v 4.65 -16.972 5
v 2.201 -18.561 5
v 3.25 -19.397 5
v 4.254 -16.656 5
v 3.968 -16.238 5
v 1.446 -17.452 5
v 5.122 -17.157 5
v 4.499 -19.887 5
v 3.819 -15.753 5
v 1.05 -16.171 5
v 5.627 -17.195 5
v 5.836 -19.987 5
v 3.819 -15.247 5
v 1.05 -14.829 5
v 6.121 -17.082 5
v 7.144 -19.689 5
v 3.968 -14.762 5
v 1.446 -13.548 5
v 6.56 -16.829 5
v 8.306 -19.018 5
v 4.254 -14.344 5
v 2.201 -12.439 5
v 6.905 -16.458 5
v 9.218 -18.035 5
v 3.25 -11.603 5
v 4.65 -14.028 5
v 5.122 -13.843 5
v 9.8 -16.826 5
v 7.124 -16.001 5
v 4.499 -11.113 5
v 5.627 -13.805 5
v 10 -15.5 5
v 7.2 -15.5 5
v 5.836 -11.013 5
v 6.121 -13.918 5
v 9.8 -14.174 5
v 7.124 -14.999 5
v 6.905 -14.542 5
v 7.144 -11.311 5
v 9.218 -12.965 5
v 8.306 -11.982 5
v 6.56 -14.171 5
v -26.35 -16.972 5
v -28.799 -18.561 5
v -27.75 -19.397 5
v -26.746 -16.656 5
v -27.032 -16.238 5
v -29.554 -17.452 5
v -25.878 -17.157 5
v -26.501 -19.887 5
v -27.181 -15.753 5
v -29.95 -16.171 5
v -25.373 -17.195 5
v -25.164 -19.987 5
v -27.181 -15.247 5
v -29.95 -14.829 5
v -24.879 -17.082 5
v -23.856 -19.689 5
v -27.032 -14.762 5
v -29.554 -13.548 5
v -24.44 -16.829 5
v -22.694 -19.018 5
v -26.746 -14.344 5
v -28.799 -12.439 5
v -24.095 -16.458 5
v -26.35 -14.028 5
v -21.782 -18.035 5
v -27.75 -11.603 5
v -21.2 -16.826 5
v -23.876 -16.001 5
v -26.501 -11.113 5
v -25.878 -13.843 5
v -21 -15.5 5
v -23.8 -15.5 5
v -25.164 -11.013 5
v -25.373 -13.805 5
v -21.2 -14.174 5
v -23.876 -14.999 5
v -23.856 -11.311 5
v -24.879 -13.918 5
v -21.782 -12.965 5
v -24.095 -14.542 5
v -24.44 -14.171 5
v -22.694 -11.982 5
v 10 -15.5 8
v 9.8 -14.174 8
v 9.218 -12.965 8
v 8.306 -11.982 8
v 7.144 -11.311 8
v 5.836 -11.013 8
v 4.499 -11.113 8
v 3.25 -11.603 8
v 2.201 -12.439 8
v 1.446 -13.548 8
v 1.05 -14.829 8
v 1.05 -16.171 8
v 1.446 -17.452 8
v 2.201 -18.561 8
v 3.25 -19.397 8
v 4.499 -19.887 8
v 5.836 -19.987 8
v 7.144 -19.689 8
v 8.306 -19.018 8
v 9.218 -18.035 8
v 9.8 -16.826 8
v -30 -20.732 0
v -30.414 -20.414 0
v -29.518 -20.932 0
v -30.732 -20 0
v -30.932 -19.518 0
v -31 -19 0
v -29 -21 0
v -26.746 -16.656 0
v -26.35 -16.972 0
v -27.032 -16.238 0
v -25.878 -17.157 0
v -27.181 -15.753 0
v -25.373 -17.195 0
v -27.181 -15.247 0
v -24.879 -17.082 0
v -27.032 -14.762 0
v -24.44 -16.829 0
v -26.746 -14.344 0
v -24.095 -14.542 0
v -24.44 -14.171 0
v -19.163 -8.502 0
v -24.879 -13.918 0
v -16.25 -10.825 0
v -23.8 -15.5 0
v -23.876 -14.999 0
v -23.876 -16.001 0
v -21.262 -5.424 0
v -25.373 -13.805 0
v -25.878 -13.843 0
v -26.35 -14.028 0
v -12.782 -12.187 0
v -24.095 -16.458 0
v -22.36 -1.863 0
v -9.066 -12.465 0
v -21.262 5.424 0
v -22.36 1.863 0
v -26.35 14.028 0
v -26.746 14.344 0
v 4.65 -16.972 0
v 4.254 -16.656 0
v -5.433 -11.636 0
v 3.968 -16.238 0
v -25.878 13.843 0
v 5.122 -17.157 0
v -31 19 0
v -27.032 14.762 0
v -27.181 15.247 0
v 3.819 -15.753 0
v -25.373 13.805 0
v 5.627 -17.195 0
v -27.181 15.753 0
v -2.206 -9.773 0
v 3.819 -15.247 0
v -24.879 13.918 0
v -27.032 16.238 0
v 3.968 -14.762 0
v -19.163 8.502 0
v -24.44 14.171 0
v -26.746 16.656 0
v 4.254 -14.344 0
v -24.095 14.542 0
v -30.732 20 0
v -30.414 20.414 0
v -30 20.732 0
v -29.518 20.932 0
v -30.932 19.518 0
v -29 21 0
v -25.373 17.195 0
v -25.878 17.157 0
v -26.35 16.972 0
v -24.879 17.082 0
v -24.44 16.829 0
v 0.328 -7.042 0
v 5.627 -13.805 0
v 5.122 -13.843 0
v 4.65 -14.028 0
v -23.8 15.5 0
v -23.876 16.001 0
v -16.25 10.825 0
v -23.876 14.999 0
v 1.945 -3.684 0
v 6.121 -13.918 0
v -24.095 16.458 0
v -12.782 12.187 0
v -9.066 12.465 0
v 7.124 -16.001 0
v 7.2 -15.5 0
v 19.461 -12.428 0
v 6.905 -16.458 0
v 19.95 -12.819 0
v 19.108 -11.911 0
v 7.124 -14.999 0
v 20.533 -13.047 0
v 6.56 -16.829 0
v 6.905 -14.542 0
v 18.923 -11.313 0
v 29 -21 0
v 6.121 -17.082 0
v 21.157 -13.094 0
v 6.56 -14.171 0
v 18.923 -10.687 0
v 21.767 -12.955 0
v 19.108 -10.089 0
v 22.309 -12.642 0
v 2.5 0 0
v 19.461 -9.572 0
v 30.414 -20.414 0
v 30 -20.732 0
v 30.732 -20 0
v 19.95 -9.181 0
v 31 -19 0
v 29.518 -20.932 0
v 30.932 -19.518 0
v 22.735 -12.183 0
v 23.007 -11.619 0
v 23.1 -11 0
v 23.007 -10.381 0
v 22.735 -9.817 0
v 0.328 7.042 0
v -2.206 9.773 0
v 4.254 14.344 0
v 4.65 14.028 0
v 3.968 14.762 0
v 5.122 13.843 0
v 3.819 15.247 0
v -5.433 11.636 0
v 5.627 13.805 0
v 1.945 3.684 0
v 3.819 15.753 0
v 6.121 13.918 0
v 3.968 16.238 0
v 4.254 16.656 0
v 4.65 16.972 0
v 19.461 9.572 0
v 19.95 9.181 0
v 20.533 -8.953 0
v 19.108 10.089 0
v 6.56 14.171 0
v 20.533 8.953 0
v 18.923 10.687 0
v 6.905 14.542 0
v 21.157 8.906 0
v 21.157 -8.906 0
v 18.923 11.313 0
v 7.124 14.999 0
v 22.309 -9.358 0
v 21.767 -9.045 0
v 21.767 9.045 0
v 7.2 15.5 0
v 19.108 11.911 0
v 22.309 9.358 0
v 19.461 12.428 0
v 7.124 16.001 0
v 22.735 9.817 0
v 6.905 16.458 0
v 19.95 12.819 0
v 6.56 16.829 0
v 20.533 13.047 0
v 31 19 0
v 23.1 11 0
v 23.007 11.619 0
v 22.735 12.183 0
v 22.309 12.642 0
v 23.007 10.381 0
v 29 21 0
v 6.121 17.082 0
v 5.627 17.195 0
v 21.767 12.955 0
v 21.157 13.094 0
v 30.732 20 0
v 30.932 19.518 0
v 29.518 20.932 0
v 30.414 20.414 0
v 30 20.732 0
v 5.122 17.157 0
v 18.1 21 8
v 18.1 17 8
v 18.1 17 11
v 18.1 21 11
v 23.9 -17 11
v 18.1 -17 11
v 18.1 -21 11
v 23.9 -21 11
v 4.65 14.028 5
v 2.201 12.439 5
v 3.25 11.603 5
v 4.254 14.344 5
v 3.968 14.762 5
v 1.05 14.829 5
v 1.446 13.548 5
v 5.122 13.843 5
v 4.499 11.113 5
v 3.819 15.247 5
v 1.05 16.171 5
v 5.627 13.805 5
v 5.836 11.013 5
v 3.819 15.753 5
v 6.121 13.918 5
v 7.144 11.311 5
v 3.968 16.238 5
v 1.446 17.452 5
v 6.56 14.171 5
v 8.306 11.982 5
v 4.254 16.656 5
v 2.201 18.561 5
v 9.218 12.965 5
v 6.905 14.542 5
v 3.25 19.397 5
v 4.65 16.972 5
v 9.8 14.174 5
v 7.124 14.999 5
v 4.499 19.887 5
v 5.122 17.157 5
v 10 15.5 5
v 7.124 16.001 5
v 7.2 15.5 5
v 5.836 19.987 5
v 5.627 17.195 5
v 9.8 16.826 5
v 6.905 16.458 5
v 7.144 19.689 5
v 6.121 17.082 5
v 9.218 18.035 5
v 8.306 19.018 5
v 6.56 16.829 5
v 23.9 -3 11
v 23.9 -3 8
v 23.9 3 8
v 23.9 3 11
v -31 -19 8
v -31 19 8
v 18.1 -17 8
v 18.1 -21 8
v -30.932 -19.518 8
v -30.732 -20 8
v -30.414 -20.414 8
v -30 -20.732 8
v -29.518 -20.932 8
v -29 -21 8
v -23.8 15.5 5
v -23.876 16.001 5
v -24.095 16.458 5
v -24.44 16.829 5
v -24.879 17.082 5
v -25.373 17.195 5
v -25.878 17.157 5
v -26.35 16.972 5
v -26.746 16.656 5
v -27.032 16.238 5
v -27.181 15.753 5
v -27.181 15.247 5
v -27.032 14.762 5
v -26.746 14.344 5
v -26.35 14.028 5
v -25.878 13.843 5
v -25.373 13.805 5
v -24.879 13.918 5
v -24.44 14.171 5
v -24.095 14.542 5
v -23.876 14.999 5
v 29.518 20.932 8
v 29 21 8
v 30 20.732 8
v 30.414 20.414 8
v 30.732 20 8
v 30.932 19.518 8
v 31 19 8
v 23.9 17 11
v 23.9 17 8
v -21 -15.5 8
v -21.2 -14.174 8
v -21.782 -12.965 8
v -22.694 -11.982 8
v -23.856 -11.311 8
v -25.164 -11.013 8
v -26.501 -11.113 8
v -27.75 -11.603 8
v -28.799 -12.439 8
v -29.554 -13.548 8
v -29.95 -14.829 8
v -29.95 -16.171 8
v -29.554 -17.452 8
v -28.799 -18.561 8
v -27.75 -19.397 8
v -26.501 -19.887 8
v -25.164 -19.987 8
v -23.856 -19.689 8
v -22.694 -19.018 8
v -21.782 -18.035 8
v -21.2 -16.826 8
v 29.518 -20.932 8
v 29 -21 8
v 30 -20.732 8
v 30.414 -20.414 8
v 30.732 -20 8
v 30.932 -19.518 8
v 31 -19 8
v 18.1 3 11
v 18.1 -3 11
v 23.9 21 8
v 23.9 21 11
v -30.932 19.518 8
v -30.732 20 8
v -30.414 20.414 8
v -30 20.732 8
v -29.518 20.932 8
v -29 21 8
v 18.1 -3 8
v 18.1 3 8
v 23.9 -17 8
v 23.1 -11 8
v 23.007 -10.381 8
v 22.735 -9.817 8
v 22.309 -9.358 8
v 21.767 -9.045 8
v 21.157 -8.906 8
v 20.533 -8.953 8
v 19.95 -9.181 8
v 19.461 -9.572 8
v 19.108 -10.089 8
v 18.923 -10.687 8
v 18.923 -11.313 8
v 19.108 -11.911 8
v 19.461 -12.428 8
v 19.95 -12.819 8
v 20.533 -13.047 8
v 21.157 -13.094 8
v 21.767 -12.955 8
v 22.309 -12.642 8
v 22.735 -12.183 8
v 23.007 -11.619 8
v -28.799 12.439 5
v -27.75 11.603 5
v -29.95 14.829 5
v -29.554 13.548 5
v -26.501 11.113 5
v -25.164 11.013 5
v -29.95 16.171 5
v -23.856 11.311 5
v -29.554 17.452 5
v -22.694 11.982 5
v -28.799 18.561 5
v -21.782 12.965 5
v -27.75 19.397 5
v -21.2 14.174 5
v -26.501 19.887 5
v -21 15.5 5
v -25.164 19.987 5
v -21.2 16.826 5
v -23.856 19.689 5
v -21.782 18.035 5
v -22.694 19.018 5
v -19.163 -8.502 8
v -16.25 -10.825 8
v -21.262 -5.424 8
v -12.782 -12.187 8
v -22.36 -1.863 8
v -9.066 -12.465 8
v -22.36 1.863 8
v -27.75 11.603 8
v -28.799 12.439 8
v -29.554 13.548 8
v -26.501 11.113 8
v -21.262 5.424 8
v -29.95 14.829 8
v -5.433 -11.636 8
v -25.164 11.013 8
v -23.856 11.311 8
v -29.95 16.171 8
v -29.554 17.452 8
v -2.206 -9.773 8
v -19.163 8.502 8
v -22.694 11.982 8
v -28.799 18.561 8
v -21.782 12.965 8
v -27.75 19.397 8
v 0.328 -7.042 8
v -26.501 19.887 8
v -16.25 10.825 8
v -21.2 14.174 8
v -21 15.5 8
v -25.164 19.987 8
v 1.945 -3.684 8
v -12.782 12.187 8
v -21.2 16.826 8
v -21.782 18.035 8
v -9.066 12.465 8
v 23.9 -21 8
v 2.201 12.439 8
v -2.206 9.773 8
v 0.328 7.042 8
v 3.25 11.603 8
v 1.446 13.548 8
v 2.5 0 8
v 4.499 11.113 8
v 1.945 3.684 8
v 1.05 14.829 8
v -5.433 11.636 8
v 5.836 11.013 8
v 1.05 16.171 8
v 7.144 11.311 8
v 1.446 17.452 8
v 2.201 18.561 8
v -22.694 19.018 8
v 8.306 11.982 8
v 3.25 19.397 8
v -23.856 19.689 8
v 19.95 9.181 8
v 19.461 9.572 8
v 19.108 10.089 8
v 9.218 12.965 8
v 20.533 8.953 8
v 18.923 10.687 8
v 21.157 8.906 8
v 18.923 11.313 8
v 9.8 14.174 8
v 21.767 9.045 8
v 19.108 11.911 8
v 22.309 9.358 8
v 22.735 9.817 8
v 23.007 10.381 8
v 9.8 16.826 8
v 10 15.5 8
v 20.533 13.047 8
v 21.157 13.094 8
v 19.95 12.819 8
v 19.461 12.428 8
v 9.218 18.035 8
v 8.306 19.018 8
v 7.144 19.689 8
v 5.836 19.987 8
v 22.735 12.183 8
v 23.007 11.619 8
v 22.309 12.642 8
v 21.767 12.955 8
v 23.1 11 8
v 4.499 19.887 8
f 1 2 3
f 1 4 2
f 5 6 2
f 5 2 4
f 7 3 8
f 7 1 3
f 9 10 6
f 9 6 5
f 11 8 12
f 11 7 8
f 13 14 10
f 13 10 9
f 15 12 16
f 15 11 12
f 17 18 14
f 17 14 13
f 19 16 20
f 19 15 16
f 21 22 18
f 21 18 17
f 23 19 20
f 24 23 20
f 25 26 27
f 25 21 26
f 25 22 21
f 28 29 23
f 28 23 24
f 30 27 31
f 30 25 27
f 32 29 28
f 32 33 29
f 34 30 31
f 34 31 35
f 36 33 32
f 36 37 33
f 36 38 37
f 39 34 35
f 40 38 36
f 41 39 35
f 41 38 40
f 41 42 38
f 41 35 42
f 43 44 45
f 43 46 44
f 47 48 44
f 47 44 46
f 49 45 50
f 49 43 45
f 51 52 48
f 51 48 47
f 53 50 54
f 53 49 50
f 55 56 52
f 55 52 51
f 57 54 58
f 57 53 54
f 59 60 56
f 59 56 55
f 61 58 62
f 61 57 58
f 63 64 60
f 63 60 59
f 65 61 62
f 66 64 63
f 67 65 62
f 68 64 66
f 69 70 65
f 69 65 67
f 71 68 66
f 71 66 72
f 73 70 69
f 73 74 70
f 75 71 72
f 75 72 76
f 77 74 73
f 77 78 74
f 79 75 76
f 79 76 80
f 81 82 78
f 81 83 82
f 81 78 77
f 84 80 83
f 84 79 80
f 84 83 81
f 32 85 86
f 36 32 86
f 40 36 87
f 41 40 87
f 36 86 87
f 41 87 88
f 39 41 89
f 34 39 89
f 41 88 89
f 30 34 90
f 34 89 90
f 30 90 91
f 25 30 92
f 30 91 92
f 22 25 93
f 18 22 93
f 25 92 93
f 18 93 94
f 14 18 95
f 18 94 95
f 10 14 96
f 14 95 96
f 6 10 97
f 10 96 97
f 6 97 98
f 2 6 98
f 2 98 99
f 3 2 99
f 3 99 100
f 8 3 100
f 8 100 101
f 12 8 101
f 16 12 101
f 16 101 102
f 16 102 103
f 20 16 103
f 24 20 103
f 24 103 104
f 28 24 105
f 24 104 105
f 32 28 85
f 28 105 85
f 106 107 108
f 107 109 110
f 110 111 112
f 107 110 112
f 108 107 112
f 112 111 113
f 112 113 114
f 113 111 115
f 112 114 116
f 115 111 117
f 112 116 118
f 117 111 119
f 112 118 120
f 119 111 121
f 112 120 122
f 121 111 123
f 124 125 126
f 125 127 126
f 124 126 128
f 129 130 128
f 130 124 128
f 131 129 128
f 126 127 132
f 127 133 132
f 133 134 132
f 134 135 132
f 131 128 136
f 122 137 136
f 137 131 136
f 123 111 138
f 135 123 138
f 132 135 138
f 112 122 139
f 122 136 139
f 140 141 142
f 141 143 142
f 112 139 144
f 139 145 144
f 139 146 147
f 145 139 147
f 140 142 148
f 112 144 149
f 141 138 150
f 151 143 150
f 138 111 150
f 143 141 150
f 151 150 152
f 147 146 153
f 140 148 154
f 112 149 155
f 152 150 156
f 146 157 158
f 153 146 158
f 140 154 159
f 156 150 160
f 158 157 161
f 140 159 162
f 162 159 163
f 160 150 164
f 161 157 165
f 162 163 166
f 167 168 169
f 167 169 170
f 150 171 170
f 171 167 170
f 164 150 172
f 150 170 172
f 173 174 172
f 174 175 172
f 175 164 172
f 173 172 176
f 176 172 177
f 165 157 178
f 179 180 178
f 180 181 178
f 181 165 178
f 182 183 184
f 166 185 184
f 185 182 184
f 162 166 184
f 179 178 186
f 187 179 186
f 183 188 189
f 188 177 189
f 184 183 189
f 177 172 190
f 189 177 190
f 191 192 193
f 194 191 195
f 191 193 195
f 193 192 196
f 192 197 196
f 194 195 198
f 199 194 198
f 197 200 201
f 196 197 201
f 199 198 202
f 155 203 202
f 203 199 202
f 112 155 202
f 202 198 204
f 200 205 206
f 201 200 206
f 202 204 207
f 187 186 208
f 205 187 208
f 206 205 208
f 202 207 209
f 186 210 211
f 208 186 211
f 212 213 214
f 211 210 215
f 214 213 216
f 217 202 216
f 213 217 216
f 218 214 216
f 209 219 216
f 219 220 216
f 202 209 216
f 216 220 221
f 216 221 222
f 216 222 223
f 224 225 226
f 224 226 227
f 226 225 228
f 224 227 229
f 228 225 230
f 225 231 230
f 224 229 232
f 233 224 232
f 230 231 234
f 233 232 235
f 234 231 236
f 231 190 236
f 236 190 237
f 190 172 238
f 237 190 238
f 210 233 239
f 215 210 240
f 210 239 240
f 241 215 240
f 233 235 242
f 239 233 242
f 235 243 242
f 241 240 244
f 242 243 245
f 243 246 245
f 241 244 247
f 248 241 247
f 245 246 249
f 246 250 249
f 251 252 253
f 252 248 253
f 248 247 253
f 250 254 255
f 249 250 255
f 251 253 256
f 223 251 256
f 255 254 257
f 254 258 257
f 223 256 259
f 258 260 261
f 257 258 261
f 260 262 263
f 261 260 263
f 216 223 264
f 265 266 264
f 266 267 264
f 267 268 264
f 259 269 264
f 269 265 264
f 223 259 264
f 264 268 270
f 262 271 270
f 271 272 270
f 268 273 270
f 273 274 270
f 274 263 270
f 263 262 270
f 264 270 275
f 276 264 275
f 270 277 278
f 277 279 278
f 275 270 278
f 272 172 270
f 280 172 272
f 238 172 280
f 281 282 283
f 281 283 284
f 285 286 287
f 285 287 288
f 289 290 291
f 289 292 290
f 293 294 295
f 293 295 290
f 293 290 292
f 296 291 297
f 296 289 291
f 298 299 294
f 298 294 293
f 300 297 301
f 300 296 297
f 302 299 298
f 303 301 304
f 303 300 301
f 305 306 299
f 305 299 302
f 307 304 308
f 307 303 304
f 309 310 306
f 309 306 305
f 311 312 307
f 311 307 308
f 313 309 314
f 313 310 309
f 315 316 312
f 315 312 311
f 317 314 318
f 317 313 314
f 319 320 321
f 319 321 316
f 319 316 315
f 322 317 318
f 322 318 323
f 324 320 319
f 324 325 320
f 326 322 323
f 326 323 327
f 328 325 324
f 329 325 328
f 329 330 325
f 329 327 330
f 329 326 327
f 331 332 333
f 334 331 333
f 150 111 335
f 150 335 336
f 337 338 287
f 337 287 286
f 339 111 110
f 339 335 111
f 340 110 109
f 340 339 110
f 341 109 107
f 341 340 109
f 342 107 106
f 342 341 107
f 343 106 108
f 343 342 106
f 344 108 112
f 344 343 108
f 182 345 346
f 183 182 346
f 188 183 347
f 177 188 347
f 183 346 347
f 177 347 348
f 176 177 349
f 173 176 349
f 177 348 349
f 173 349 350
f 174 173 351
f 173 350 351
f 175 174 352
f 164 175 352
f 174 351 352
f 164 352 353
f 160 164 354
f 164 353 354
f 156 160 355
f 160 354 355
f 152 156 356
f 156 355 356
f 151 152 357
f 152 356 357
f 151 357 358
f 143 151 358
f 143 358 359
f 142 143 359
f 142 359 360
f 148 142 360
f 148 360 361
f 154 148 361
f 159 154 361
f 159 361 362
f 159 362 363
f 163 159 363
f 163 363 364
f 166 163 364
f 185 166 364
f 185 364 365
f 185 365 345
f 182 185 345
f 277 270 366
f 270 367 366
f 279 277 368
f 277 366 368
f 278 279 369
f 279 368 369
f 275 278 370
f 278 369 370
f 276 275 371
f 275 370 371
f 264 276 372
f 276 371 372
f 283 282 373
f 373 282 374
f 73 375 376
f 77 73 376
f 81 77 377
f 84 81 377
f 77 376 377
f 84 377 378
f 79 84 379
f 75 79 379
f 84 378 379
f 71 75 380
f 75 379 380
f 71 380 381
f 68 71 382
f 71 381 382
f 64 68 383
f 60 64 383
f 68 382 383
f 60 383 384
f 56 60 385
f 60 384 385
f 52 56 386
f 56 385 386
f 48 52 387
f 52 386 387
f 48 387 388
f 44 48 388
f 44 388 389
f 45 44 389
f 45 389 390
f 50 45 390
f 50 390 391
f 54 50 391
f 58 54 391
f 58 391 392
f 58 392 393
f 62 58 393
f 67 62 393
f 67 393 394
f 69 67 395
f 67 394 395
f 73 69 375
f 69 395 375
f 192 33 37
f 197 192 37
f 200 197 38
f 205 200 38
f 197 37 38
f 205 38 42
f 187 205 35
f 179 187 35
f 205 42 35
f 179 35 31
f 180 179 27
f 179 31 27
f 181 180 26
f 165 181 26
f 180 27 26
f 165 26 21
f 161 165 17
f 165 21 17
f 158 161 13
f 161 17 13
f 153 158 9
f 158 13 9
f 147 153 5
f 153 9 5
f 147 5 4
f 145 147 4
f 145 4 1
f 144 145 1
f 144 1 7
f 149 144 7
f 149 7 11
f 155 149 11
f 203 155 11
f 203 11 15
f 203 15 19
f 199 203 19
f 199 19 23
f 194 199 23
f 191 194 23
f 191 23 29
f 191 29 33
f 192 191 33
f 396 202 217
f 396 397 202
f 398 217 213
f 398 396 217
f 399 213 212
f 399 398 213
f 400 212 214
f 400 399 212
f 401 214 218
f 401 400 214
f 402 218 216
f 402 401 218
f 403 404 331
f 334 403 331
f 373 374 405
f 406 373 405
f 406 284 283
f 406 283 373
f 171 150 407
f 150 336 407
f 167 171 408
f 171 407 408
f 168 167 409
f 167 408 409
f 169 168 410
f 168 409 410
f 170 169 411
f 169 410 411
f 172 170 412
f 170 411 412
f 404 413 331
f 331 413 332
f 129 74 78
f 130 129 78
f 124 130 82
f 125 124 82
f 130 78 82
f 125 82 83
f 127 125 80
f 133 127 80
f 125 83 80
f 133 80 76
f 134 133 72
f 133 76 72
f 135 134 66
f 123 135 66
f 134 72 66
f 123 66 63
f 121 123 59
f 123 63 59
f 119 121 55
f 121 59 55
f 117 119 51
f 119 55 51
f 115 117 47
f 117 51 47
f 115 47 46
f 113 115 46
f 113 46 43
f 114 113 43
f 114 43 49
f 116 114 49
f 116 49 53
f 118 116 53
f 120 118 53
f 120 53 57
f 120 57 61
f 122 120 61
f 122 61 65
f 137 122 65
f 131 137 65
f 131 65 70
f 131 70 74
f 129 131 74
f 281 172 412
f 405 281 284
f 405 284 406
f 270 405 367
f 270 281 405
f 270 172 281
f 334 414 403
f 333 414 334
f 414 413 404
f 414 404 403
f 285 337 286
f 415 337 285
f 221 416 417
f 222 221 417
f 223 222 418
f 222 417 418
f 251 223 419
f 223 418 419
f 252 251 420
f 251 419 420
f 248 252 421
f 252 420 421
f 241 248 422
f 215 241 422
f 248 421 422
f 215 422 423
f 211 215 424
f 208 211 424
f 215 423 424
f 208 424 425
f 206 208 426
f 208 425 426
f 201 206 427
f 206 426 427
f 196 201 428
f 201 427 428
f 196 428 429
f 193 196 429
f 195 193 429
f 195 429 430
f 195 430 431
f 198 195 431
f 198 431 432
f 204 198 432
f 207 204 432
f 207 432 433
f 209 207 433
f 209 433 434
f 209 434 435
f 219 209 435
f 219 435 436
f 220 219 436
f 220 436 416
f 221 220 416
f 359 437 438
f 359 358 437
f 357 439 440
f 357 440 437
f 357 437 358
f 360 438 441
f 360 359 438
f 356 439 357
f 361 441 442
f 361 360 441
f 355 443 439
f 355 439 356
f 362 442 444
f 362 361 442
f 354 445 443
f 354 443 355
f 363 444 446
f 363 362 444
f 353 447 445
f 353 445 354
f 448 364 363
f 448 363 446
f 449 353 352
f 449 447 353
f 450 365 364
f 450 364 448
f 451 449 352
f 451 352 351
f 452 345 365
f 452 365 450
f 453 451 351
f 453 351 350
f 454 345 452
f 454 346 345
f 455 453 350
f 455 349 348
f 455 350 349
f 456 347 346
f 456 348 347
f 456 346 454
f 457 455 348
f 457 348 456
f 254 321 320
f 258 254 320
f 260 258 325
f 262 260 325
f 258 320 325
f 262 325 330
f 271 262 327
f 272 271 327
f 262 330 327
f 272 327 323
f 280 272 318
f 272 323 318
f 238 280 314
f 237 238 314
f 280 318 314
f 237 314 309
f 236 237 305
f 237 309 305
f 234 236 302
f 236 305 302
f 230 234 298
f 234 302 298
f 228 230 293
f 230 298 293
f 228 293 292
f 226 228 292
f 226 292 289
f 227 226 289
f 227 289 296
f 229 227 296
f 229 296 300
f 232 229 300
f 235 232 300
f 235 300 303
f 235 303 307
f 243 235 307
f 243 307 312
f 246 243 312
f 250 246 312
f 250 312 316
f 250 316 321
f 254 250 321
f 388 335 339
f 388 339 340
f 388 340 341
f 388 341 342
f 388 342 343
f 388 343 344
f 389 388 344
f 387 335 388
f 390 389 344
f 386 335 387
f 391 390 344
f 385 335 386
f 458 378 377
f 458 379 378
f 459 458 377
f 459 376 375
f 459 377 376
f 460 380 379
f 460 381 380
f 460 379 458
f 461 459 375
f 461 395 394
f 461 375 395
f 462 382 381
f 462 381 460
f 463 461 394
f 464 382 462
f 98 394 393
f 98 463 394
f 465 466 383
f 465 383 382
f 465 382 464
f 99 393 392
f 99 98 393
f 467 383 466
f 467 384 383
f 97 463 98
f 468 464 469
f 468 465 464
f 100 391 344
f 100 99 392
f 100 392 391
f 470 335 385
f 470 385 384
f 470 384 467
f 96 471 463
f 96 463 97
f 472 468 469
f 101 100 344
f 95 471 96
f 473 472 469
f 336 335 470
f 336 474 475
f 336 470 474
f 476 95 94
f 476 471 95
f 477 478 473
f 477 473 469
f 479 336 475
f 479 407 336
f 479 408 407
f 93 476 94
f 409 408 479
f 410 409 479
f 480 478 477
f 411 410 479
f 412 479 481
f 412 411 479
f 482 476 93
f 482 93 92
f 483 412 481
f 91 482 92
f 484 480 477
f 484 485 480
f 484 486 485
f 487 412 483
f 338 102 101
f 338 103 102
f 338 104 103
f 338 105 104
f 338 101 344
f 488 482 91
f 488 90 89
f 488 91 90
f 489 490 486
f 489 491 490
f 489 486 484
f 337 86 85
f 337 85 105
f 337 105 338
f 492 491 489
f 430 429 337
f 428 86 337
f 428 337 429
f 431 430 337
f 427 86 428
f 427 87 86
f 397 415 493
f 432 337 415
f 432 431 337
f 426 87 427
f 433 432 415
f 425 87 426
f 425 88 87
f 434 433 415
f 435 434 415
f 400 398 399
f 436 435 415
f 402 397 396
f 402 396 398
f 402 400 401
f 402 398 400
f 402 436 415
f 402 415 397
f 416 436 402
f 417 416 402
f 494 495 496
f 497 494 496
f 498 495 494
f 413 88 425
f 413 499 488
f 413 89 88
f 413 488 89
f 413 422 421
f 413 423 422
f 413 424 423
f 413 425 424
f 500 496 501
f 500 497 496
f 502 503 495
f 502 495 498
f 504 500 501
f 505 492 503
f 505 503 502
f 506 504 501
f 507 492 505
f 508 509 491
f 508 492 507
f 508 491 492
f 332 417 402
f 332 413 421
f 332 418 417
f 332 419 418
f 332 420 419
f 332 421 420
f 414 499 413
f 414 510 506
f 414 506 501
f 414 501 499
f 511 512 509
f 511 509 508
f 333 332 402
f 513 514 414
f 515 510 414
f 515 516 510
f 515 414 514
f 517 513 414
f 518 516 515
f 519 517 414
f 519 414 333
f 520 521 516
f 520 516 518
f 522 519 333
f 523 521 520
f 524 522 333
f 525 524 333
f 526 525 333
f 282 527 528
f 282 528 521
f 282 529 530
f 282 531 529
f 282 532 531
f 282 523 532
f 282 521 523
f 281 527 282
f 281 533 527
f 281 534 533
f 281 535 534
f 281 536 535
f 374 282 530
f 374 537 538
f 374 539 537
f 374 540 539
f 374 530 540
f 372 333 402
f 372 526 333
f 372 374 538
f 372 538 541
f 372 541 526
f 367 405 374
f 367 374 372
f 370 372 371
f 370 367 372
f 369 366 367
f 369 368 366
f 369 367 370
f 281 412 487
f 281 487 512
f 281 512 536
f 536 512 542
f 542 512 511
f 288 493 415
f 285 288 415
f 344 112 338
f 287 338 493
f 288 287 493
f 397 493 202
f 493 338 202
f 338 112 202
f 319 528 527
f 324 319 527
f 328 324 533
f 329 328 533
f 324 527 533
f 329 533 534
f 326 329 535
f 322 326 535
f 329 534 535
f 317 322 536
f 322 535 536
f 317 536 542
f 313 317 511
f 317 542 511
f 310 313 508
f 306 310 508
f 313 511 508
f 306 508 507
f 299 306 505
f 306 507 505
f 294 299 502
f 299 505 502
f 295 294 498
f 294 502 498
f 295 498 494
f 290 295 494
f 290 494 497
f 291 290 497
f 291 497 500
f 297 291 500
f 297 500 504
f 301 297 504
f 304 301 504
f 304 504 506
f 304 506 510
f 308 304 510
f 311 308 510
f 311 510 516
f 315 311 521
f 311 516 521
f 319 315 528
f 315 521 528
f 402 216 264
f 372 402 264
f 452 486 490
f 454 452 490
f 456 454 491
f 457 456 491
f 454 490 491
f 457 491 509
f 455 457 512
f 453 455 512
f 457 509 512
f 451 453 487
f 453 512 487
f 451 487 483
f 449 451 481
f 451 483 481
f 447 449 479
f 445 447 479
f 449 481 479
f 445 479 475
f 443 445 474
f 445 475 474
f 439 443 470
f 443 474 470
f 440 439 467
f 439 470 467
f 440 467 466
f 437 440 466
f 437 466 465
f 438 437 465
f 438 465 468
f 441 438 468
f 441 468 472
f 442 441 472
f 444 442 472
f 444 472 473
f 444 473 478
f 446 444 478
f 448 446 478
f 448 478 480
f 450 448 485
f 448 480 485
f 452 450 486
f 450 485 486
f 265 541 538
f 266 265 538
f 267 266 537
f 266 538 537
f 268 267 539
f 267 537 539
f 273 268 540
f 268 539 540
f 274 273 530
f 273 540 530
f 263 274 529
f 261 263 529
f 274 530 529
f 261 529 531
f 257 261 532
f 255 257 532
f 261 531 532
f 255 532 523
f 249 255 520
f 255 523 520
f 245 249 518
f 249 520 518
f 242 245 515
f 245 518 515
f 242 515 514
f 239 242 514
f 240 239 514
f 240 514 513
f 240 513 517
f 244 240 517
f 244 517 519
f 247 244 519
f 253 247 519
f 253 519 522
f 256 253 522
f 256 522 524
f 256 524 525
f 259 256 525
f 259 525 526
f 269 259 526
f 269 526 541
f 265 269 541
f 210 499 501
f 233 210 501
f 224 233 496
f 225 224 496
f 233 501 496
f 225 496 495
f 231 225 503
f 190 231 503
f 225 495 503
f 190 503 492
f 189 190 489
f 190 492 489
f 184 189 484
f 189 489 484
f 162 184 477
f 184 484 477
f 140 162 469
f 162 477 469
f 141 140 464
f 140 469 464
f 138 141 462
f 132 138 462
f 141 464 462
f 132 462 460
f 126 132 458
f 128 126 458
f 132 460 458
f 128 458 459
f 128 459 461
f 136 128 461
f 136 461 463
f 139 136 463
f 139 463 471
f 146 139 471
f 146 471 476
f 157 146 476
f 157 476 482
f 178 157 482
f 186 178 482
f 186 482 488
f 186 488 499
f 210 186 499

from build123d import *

# Parameters (mm, degrees)
ESQUISSE1_W             = 62
ESQUISSE1_H             = 42
BOSS_EXTRU_1_DEPTH      = 8
ESQUISSE2_R             = 2.1
ESQUISSE2_R_2           = 12.5
ESQUISSE2_R_3           = 1.7
ENL_V_MAT_EXTRU_1_DEPTH = 9
ESQUISSE3_W             = 5.8
ESQUISSE3_H             = 4
ESQUISSE3_H_2           = 6
BOSS_EXTRU_2_DEPTH      = 3
CONG_1_R                = 2
ESQUISSE4_R             = 4.5
ENL_V_MAT_EXTRU_2_DEPTH = 3


with BuildPart() as part:
    # Esquisse1 → Boss.-Extru.1 (new body)
    with BuildSketch(Plane.XY):
        Rectangle(ESQUISSE1_W, ESQUISSE1_H)
    extrude(amount=BOSS_EXTRU_1_DEPTH)

    # Esquisse2 → Enlèv. mat.-Extru.1 (cut, through all)
    with BuildSketch(Plane.XY.offset(8)):
        with Locations((21, 11)):
            Circle(ESQUISSE2_R)
        with Locations((21, -11)):
            Circle(ESQUISSE2_R)
        with Locations((-10, 0)):
            Circle(ESQUISSE2_R_2)
        with Locations((-25.5, 15.5)):
            Circle(ESQUISSE2_R_3)
        with Locations((5.5, 15.5)):
            Circle(ESQUISSE2_R_3)
        with Locations((5.5, -15.5)):
            Circle(ESQUISSE2_R_3)
        with Locations((-25.5, -15.5)):
            Circle(ESQUISSE2_R_3)
    extrude(amount=-ENL_V_MAT_EXTRU_1_DEPTH, mode=Mode.SUBTRACT)

    # Esquisse3 → Boss.-Extru.2 (add)
    with BuildSketch(Plane.XY.offset(8)):
        with Locations((21, 19)):
            Rectangle(ESQUISSE3_W, ESQUISSE3_H)
        with Locations((21, -19)):
            Rectangle(ESQUISSE3_W, ESQUISSE3_H)
        with Locations((21, 0)):
            Rectangle(ESQUISSE3_W, ESQUISSE3_H_2)
    extrude(amount=BOSS_EXTRU_2_DEPTH)

    # Congé1
    cong_1_edges = [part.edges().sort_by_distance(p)[0] for p in [
        (-31, 21, 4),
        (-31, -21, 4),
        (31, 21, 4),
        (31, -21, 4),
    ]]
    fillet(cong_1_edges, radius=CONG_1_R)

    # Esquisse4 → Enlèv. mat.-Extru.2 (cut)
    with BuildSketch(Plane.XY.offset(8)):
        with Locations((-25.5, 15.5)):
            Circle(ESQUISSE4_R)
        with Locations((-25.5, -15.5)):
            Circle(ESQUISSE4_R)
        with Locations((5.5, -15.5)):
            Circle(ESQUISSE4_R)
        with Locations((5.5, 15.5)):
            Circle(ESQUISSE4_R)
    extrude(amount=-ENL_V_MAT_EXTRU_2_DEPTH, mode=Mode.SUBTRACT)


solid = part.part
